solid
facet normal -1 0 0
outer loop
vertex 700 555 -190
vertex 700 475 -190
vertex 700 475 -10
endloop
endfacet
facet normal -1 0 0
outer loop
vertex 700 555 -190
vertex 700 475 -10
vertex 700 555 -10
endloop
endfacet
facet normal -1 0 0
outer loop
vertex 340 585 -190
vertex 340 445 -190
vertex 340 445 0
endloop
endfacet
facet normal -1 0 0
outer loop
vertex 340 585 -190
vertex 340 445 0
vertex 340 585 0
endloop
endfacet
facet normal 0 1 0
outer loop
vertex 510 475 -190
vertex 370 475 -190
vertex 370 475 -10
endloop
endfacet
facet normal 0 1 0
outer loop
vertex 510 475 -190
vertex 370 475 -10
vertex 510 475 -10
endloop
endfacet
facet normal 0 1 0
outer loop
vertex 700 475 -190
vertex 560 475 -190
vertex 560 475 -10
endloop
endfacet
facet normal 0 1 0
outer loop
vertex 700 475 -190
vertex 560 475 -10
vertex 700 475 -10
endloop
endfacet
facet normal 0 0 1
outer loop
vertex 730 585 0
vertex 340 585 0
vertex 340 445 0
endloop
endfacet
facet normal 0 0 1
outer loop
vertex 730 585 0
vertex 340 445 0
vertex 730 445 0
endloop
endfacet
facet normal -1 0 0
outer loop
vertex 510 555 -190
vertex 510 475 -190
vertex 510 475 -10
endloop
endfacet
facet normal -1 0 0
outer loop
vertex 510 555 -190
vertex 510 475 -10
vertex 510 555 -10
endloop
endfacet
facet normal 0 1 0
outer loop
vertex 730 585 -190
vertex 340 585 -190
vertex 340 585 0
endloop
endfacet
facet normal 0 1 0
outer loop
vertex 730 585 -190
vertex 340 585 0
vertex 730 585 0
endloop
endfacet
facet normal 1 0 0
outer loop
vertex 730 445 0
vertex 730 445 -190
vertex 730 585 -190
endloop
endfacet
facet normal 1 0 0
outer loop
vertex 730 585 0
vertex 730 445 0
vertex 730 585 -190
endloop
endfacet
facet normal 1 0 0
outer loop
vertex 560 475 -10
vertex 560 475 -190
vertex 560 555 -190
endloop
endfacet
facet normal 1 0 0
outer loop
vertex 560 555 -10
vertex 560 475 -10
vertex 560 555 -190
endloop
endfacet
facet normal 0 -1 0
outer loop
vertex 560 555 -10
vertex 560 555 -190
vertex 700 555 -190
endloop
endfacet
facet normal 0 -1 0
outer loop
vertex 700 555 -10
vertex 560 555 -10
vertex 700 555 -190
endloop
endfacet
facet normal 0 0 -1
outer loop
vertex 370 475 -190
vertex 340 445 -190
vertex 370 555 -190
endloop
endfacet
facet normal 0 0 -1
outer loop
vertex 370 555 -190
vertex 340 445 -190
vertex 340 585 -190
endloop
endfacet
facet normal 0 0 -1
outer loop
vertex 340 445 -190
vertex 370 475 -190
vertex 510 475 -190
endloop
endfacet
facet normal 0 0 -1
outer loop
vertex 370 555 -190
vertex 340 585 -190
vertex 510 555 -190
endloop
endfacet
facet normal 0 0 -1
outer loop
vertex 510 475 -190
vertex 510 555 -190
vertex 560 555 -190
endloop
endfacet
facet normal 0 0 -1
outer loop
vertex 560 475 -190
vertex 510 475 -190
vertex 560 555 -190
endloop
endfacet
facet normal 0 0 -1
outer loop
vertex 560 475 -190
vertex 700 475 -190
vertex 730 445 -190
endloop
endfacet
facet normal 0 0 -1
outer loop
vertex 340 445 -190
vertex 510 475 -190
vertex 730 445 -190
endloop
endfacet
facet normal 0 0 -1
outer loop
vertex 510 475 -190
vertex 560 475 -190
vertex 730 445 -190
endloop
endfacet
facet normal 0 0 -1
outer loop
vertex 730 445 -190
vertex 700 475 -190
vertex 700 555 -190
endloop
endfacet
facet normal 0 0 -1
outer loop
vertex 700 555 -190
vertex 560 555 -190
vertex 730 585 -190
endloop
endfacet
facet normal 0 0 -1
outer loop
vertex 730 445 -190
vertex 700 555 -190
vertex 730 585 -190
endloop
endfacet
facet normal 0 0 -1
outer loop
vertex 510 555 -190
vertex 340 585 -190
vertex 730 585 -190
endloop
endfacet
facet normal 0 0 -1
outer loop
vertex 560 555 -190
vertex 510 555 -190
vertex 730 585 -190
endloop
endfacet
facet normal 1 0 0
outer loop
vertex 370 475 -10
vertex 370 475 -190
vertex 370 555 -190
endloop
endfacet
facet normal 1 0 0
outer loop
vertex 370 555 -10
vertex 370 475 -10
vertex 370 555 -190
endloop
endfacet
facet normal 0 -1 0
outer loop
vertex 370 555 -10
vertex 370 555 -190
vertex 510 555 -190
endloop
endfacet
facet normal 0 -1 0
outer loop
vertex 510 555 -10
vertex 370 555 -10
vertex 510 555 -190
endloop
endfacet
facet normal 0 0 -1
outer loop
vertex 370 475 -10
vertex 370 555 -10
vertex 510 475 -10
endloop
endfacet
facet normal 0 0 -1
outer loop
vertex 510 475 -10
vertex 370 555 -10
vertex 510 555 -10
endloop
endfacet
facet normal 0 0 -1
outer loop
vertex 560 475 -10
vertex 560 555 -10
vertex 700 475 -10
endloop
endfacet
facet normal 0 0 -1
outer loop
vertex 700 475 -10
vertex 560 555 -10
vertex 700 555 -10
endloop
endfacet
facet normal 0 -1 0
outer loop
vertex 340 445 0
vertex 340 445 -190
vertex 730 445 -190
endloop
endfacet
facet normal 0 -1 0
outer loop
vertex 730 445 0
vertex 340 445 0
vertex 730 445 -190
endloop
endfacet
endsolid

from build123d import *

# Parameters (mm, degrees)
BOX105_W     = 140
BOX105_H     = 80
BOX105_DEPTH = 180
BOX104_W     = 140
BOX104_H     = 80
BOX104_DEPTH = 180
BOX106_W     = 390
BOX106_H     = 140
BOX106_DEPTH = 190


with BuildPart() as cube077:
    # Box105 → Box105 (new body)
    with BuildSketch(Plane(origin=(220, 30, 0), x_dir=(1, 0, 0), z_dir=(0, 0, 1))):
        with Locations((70, 40)):
            Rectangle(BOX105_W, BOX105_H)
    extrude(amount=BOX105_DEPTH)


with BuildPart() as fusion018:
    # Box104 → Box104 (new body)
    with BuildSketch(Plane(origin=(30, 30, 0), x_dir=(1, 0, 0), z_dir=(0, 0, 1))):
        with Locations((70, 40)):
            Rectangle(BOX104_W, BOX104_H)
    extrude(amount=BOX104_DEPTH)

    # Fusion018: union Cube077
    add(cube077.part)


with BuildPart() as cut013:
    # Box106 → Box106 (new body)
    with BuildSketch(Plane.XY):
        with Locations((195, 70)):
            Rectangle(BOX106_W, BOX106_H)
    extrude(amount=BOX106_DEPTH)

    # Cut013: cut Fusion018
    add(fusion018.part, mode=Mode.SUBTRACT)


with BuildPart() as cut013_1:
    # Cut013 placement: moved
    add(cut013.part.moved(Location((340, 445, -190))))


solid = cut013_1.part
